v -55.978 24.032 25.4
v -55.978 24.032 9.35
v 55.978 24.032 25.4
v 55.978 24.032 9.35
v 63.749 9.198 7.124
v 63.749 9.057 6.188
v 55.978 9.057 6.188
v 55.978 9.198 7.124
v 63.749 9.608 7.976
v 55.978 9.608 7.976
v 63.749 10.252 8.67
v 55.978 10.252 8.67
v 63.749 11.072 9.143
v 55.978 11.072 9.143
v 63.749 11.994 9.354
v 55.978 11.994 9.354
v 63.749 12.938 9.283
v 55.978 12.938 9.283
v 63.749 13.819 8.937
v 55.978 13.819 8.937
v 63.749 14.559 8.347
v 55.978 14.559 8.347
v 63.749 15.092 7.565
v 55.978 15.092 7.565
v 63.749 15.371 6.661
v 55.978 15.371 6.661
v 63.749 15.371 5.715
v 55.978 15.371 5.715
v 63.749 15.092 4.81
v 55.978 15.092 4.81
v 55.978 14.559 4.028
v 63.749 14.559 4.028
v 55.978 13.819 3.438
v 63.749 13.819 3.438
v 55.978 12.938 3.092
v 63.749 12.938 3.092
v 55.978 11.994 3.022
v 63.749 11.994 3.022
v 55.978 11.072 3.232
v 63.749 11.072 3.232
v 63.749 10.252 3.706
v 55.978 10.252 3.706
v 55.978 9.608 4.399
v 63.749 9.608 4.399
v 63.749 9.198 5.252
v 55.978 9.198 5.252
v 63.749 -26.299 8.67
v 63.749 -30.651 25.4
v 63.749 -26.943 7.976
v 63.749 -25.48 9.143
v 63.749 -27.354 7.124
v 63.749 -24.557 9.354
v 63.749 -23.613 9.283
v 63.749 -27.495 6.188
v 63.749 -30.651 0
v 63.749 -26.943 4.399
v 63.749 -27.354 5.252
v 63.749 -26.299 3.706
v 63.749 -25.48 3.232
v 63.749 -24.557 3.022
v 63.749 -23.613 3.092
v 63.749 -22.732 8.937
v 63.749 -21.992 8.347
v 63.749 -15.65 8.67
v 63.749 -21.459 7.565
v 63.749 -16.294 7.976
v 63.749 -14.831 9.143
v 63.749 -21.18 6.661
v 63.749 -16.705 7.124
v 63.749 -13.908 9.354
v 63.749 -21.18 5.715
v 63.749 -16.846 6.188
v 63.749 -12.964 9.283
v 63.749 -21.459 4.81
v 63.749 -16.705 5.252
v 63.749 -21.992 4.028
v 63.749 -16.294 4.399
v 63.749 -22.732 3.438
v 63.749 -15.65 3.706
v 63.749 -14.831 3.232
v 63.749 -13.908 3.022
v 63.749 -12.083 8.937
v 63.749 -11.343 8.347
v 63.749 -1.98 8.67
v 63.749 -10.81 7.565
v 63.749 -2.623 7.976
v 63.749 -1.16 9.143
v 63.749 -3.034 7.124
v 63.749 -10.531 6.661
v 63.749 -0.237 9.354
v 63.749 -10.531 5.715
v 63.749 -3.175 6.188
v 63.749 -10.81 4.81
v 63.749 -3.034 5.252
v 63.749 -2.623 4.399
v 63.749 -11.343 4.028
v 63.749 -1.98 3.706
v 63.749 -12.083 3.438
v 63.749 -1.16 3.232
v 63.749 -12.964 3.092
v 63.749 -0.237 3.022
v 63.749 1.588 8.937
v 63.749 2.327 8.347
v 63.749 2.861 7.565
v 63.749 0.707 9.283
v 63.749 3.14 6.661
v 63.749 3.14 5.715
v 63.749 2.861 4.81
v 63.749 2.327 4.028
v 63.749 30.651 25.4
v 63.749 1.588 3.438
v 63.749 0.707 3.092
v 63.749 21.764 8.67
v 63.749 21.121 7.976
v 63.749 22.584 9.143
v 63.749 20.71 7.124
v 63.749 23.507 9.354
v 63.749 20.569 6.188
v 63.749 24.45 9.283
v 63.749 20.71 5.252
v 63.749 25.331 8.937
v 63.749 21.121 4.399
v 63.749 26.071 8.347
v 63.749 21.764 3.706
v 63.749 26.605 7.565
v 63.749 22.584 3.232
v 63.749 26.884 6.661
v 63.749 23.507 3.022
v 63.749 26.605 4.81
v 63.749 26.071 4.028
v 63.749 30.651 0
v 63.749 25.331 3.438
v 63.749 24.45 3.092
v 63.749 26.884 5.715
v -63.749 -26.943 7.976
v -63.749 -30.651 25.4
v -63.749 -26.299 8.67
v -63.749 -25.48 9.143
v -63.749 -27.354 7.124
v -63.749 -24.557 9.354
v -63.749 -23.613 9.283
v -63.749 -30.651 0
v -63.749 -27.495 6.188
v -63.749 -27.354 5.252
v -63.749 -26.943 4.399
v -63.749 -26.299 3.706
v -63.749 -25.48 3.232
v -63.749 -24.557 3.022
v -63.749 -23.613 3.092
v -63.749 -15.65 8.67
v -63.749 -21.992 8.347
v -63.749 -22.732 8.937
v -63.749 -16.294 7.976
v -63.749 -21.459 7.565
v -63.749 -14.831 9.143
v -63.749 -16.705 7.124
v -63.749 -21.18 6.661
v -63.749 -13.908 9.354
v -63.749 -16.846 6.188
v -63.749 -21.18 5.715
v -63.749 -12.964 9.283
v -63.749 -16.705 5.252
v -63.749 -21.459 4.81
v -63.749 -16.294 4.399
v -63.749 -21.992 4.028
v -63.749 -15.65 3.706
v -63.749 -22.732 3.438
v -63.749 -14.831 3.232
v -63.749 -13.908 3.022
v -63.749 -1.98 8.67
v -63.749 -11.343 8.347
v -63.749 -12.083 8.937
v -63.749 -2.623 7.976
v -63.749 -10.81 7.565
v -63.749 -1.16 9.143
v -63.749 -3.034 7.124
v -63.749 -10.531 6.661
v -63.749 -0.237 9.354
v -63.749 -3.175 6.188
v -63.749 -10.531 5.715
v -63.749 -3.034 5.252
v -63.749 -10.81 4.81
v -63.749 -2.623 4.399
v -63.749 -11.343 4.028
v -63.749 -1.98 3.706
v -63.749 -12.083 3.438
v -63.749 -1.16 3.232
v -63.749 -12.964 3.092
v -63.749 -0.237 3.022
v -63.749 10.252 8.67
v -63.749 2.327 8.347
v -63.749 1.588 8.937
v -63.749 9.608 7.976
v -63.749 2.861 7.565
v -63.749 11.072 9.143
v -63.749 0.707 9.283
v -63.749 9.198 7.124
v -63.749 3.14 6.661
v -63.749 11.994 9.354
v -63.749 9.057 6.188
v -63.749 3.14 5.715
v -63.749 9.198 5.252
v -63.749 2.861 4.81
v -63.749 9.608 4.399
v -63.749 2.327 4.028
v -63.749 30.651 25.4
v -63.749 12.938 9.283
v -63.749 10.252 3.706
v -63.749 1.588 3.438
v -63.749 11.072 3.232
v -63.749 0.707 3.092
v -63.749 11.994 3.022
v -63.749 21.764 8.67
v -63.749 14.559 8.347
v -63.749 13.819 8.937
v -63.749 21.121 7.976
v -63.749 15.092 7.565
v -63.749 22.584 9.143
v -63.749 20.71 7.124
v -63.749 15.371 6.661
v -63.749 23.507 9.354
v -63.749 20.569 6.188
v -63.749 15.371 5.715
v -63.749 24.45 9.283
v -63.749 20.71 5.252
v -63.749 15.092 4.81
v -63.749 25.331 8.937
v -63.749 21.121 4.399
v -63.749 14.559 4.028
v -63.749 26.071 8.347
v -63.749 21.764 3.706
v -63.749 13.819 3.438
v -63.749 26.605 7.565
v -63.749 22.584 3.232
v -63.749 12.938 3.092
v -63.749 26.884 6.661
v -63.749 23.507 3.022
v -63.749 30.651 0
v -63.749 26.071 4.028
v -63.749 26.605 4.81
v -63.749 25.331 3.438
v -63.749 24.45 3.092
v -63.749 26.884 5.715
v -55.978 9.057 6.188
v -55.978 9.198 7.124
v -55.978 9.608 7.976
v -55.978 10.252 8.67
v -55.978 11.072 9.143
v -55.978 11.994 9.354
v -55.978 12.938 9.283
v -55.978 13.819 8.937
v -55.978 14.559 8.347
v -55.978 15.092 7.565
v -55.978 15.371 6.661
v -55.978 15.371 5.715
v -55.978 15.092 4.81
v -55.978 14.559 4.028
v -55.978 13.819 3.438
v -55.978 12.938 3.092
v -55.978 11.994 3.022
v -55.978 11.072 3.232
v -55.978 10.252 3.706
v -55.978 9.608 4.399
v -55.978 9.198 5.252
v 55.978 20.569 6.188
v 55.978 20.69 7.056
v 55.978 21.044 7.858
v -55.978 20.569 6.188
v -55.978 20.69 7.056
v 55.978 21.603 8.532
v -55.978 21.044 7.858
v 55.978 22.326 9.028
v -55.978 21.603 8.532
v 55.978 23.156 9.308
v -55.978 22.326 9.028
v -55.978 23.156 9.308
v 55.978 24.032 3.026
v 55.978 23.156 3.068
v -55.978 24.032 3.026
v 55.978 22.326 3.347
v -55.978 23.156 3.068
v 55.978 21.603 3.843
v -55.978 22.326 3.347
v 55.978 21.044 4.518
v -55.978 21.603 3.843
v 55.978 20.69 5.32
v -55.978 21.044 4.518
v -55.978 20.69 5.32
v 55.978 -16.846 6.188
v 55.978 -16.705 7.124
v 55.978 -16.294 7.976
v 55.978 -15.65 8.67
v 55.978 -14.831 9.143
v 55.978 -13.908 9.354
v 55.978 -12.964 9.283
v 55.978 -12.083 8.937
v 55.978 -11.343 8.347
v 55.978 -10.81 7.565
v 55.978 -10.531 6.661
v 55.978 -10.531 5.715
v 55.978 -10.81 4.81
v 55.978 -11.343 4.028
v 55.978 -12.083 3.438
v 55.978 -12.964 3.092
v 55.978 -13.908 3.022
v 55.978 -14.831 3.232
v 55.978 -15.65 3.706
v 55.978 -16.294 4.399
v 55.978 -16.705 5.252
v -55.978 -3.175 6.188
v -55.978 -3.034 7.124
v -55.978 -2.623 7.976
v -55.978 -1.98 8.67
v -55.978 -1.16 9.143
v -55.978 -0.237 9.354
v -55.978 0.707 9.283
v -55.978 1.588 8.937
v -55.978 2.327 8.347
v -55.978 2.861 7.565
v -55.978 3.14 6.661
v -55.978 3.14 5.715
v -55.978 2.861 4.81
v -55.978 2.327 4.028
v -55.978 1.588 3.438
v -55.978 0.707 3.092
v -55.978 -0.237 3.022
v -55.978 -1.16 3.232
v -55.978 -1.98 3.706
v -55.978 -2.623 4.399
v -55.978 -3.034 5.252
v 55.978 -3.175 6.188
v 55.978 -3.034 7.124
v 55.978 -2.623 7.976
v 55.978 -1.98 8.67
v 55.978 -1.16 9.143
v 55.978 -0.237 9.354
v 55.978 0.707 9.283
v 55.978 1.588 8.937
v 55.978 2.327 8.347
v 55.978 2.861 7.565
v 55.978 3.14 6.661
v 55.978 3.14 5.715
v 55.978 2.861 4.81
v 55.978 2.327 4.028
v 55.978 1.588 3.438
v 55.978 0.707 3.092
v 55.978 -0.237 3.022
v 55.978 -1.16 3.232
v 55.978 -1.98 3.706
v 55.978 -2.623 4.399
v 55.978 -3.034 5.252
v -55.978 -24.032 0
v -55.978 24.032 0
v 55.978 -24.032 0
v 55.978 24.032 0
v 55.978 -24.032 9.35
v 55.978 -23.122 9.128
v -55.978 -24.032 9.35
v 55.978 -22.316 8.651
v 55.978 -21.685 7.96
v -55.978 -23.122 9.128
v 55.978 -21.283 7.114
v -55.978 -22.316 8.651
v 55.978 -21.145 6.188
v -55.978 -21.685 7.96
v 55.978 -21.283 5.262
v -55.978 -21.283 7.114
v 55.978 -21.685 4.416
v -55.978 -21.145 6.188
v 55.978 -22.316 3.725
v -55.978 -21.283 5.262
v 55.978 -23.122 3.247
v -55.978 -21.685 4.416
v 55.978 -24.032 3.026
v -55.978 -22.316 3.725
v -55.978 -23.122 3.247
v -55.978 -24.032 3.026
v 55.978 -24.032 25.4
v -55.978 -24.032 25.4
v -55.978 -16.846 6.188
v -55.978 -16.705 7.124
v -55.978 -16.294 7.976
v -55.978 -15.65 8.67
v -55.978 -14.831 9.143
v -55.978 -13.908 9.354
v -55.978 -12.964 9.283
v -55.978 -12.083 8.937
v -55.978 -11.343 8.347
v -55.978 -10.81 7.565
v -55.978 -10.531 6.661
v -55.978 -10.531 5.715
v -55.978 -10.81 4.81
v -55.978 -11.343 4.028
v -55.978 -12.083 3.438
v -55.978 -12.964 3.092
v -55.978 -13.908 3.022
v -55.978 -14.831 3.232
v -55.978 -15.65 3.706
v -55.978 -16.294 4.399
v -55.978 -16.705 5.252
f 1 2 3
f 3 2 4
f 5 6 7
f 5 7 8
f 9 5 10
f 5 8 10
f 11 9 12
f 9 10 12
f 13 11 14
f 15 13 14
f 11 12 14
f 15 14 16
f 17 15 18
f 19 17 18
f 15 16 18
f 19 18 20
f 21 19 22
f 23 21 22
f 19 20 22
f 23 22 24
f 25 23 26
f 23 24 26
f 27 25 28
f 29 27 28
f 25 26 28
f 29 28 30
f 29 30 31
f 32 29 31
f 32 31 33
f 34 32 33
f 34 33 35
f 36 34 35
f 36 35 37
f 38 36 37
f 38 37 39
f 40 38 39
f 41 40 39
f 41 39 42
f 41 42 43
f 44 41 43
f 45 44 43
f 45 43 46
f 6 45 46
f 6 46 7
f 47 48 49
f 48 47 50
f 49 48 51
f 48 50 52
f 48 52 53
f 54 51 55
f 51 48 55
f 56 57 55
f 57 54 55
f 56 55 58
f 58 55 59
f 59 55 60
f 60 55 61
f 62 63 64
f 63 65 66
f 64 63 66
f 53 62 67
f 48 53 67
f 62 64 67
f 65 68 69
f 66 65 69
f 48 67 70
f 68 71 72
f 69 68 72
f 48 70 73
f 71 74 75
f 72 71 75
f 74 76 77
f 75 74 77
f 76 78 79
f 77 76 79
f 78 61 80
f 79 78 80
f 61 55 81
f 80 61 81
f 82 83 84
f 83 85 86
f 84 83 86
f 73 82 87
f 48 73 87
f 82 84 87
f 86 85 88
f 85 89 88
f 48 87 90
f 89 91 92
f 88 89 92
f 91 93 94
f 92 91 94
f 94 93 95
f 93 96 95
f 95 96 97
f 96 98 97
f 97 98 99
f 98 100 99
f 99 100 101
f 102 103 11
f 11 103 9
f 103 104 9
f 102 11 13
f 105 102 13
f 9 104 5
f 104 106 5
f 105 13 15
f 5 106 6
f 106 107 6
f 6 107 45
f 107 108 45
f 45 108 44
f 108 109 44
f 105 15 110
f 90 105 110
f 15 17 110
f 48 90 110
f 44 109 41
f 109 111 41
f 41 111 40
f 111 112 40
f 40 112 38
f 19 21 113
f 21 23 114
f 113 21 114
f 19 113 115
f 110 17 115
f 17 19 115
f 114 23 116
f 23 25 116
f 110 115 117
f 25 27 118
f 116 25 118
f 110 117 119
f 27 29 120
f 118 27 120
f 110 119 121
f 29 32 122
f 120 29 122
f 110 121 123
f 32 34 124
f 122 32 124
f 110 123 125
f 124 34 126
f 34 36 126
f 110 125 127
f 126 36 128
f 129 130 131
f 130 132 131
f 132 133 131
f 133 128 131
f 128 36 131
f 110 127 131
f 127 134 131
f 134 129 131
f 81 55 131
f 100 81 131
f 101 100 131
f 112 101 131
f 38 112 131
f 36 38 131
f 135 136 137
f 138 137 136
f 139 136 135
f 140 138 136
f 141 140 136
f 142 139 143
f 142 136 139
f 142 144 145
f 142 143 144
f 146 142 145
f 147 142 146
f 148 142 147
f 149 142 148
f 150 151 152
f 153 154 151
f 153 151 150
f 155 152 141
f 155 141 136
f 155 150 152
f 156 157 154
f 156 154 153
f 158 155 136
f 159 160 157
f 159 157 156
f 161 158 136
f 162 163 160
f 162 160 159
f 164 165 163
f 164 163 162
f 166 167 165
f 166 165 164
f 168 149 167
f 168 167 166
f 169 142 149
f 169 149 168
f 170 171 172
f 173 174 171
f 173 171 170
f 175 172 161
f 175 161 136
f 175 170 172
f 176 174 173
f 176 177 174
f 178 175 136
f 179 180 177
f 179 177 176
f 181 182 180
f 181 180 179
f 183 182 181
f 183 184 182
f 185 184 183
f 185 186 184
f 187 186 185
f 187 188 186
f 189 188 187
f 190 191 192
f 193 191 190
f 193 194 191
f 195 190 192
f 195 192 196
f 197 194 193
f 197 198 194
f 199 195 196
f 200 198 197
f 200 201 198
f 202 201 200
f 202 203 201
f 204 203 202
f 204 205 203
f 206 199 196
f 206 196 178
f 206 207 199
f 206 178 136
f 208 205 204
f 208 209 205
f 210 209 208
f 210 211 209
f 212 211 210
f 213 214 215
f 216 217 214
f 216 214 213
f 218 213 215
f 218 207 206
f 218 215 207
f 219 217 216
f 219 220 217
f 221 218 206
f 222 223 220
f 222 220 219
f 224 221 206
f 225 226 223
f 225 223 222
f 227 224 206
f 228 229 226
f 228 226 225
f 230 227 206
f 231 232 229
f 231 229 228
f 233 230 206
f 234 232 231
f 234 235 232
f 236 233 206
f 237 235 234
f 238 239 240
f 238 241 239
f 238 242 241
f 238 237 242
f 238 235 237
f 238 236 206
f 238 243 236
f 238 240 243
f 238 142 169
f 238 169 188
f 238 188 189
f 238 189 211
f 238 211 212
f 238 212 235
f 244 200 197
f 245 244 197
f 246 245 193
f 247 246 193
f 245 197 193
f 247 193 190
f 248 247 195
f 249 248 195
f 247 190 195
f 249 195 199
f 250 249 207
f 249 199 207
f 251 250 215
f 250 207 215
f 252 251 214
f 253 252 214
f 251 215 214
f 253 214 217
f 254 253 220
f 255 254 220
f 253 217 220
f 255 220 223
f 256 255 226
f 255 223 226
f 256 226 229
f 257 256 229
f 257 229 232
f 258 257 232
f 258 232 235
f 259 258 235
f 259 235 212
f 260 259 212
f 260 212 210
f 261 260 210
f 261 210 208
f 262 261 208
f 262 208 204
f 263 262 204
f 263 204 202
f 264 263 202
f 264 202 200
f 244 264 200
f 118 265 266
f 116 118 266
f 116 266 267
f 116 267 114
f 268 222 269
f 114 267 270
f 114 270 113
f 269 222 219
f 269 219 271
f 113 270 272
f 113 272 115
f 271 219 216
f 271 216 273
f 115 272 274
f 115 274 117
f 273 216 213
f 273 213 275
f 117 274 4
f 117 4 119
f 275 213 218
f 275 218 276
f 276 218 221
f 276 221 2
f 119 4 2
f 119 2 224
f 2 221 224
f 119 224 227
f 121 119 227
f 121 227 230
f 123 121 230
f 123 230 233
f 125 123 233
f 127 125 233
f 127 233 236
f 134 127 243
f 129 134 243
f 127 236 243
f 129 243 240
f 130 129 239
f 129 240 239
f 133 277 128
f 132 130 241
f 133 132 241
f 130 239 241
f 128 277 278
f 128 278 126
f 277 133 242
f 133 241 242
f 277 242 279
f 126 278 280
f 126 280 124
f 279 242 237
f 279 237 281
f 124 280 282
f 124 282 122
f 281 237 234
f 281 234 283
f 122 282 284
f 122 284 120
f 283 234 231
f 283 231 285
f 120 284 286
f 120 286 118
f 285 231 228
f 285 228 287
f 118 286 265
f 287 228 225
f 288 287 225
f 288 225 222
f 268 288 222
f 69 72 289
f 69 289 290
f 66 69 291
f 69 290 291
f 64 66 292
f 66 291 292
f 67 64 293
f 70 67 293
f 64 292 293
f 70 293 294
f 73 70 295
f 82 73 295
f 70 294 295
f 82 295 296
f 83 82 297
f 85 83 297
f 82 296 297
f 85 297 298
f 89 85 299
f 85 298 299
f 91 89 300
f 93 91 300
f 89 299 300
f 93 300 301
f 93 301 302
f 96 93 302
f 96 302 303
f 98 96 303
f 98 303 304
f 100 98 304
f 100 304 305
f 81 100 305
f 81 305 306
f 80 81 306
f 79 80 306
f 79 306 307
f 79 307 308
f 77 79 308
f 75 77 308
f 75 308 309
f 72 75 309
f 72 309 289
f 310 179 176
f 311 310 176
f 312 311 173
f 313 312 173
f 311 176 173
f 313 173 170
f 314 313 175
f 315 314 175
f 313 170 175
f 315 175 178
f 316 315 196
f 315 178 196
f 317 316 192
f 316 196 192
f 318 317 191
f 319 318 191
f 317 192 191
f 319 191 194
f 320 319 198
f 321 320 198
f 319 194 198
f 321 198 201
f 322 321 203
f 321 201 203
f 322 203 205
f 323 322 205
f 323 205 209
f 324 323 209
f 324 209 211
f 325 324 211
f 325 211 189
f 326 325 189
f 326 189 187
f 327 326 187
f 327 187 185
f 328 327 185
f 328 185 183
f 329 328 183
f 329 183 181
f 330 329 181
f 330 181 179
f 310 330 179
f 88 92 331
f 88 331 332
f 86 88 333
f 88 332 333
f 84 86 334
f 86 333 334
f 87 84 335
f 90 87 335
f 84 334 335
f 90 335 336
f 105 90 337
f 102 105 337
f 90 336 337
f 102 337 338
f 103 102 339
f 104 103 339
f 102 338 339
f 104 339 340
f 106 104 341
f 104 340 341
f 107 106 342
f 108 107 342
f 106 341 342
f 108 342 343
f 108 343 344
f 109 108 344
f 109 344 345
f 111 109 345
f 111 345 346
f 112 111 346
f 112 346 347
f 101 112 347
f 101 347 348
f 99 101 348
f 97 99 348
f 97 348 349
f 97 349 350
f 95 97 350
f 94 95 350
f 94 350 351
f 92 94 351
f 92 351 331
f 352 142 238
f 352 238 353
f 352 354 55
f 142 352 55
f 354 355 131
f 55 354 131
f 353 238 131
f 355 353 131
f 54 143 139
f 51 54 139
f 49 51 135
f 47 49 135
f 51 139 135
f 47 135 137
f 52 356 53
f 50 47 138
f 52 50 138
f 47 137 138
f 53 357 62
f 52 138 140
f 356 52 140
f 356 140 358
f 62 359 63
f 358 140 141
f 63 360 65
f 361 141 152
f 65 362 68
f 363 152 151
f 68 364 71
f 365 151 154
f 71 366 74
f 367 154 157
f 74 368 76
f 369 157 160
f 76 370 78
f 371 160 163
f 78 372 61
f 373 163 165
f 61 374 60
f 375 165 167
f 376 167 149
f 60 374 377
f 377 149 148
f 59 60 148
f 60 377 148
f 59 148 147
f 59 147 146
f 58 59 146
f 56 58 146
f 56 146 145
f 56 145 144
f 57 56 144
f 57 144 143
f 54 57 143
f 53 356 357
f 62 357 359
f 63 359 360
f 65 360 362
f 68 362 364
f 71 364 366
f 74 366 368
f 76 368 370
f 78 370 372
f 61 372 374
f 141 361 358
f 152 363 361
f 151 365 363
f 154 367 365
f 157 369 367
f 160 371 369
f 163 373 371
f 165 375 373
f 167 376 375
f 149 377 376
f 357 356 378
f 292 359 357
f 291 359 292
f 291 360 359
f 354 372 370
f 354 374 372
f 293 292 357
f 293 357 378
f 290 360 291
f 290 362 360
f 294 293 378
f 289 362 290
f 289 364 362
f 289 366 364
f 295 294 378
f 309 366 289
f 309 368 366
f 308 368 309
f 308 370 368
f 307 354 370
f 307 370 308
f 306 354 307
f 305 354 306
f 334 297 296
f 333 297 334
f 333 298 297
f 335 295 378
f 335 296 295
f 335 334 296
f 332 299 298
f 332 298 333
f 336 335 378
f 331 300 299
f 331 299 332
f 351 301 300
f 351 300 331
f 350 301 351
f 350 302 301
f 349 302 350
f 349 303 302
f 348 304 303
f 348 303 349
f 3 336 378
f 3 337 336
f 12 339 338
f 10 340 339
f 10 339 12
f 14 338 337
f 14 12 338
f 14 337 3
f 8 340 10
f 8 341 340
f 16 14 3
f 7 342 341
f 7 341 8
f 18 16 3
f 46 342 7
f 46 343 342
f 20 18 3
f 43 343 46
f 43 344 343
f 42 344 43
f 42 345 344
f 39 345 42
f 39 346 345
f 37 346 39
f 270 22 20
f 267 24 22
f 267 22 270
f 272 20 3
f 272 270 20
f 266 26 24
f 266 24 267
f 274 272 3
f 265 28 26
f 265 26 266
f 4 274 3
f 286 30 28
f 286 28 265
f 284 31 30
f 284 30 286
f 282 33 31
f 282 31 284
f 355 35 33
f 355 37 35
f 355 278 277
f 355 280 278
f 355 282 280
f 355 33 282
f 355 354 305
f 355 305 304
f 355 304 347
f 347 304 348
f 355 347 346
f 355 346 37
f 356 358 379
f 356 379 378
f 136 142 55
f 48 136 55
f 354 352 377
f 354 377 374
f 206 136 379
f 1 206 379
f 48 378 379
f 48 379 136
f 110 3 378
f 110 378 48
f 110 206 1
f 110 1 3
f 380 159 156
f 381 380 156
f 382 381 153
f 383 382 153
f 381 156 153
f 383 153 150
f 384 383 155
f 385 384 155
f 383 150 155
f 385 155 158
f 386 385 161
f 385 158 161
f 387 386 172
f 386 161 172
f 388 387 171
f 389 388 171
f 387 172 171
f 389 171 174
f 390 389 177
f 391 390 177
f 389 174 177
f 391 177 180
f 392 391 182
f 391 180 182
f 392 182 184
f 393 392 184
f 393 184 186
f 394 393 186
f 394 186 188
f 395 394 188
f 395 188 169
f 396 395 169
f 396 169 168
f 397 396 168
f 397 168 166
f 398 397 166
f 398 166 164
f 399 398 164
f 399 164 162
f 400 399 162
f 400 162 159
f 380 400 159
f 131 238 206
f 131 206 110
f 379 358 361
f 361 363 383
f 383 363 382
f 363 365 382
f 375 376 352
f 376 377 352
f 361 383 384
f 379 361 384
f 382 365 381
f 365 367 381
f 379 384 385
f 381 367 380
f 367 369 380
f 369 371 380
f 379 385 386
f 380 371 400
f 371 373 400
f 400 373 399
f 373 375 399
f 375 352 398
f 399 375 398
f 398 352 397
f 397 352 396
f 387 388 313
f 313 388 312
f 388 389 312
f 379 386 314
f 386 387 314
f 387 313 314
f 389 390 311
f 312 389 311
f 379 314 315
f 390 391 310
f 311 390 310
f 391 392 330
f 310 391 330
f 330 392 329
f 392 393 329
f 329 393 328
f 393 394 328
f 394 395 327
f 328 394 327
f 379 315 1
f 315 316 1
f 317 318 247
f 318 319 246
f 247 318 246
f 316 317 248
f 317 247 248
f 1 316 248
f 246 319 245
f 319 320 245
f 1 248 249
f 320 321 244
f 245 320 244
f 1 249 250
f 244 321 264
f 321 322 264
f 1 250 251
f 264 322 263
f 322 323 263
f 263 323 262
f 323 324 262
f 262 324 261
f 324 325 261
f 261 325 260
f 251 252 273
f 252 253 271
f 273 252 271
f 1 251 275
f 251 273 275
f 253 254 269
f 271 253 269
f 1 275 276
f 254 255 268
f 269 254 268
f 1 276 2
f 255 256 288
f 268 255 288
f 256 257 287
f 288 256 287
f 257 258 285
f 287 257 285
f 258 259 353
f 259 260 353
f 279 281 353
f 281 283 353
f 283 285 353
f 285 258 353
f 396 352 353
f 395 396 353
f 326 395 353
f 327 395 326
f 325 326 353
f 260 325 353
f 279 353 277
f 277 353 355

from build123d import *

# Parameters (mm, degrees)
F0_W     = 127.497956
F0_H     = 61.302628
F0_W_2   = 111.95644
F0_H_2   = 48.063566
F1_DEPTH = 25.4
F3_D     = 6.35


with BuildPart() as f1:
    # F0 (on Top) → F1 (new body)
    with BuildSketch(Plane.XY):
        Rectangle(F0_W, F0_H)
        Rectangle(F0_W_2, F0_H_2, mode=Mode.SUBTRACT)
    extrude(amount=F1_DEPTH)

    # F3 (through all)
    with Locations(Plane.YZ.offset(63.748978)):
        with Locations((-24.319587, 6.187824), (-13.670773, 6.187824), (0, 6.187824), (12.231745, 6.187824), (23.743972, 6.187824)):
            Hole(F3_D / 2)


solid = f1.part
